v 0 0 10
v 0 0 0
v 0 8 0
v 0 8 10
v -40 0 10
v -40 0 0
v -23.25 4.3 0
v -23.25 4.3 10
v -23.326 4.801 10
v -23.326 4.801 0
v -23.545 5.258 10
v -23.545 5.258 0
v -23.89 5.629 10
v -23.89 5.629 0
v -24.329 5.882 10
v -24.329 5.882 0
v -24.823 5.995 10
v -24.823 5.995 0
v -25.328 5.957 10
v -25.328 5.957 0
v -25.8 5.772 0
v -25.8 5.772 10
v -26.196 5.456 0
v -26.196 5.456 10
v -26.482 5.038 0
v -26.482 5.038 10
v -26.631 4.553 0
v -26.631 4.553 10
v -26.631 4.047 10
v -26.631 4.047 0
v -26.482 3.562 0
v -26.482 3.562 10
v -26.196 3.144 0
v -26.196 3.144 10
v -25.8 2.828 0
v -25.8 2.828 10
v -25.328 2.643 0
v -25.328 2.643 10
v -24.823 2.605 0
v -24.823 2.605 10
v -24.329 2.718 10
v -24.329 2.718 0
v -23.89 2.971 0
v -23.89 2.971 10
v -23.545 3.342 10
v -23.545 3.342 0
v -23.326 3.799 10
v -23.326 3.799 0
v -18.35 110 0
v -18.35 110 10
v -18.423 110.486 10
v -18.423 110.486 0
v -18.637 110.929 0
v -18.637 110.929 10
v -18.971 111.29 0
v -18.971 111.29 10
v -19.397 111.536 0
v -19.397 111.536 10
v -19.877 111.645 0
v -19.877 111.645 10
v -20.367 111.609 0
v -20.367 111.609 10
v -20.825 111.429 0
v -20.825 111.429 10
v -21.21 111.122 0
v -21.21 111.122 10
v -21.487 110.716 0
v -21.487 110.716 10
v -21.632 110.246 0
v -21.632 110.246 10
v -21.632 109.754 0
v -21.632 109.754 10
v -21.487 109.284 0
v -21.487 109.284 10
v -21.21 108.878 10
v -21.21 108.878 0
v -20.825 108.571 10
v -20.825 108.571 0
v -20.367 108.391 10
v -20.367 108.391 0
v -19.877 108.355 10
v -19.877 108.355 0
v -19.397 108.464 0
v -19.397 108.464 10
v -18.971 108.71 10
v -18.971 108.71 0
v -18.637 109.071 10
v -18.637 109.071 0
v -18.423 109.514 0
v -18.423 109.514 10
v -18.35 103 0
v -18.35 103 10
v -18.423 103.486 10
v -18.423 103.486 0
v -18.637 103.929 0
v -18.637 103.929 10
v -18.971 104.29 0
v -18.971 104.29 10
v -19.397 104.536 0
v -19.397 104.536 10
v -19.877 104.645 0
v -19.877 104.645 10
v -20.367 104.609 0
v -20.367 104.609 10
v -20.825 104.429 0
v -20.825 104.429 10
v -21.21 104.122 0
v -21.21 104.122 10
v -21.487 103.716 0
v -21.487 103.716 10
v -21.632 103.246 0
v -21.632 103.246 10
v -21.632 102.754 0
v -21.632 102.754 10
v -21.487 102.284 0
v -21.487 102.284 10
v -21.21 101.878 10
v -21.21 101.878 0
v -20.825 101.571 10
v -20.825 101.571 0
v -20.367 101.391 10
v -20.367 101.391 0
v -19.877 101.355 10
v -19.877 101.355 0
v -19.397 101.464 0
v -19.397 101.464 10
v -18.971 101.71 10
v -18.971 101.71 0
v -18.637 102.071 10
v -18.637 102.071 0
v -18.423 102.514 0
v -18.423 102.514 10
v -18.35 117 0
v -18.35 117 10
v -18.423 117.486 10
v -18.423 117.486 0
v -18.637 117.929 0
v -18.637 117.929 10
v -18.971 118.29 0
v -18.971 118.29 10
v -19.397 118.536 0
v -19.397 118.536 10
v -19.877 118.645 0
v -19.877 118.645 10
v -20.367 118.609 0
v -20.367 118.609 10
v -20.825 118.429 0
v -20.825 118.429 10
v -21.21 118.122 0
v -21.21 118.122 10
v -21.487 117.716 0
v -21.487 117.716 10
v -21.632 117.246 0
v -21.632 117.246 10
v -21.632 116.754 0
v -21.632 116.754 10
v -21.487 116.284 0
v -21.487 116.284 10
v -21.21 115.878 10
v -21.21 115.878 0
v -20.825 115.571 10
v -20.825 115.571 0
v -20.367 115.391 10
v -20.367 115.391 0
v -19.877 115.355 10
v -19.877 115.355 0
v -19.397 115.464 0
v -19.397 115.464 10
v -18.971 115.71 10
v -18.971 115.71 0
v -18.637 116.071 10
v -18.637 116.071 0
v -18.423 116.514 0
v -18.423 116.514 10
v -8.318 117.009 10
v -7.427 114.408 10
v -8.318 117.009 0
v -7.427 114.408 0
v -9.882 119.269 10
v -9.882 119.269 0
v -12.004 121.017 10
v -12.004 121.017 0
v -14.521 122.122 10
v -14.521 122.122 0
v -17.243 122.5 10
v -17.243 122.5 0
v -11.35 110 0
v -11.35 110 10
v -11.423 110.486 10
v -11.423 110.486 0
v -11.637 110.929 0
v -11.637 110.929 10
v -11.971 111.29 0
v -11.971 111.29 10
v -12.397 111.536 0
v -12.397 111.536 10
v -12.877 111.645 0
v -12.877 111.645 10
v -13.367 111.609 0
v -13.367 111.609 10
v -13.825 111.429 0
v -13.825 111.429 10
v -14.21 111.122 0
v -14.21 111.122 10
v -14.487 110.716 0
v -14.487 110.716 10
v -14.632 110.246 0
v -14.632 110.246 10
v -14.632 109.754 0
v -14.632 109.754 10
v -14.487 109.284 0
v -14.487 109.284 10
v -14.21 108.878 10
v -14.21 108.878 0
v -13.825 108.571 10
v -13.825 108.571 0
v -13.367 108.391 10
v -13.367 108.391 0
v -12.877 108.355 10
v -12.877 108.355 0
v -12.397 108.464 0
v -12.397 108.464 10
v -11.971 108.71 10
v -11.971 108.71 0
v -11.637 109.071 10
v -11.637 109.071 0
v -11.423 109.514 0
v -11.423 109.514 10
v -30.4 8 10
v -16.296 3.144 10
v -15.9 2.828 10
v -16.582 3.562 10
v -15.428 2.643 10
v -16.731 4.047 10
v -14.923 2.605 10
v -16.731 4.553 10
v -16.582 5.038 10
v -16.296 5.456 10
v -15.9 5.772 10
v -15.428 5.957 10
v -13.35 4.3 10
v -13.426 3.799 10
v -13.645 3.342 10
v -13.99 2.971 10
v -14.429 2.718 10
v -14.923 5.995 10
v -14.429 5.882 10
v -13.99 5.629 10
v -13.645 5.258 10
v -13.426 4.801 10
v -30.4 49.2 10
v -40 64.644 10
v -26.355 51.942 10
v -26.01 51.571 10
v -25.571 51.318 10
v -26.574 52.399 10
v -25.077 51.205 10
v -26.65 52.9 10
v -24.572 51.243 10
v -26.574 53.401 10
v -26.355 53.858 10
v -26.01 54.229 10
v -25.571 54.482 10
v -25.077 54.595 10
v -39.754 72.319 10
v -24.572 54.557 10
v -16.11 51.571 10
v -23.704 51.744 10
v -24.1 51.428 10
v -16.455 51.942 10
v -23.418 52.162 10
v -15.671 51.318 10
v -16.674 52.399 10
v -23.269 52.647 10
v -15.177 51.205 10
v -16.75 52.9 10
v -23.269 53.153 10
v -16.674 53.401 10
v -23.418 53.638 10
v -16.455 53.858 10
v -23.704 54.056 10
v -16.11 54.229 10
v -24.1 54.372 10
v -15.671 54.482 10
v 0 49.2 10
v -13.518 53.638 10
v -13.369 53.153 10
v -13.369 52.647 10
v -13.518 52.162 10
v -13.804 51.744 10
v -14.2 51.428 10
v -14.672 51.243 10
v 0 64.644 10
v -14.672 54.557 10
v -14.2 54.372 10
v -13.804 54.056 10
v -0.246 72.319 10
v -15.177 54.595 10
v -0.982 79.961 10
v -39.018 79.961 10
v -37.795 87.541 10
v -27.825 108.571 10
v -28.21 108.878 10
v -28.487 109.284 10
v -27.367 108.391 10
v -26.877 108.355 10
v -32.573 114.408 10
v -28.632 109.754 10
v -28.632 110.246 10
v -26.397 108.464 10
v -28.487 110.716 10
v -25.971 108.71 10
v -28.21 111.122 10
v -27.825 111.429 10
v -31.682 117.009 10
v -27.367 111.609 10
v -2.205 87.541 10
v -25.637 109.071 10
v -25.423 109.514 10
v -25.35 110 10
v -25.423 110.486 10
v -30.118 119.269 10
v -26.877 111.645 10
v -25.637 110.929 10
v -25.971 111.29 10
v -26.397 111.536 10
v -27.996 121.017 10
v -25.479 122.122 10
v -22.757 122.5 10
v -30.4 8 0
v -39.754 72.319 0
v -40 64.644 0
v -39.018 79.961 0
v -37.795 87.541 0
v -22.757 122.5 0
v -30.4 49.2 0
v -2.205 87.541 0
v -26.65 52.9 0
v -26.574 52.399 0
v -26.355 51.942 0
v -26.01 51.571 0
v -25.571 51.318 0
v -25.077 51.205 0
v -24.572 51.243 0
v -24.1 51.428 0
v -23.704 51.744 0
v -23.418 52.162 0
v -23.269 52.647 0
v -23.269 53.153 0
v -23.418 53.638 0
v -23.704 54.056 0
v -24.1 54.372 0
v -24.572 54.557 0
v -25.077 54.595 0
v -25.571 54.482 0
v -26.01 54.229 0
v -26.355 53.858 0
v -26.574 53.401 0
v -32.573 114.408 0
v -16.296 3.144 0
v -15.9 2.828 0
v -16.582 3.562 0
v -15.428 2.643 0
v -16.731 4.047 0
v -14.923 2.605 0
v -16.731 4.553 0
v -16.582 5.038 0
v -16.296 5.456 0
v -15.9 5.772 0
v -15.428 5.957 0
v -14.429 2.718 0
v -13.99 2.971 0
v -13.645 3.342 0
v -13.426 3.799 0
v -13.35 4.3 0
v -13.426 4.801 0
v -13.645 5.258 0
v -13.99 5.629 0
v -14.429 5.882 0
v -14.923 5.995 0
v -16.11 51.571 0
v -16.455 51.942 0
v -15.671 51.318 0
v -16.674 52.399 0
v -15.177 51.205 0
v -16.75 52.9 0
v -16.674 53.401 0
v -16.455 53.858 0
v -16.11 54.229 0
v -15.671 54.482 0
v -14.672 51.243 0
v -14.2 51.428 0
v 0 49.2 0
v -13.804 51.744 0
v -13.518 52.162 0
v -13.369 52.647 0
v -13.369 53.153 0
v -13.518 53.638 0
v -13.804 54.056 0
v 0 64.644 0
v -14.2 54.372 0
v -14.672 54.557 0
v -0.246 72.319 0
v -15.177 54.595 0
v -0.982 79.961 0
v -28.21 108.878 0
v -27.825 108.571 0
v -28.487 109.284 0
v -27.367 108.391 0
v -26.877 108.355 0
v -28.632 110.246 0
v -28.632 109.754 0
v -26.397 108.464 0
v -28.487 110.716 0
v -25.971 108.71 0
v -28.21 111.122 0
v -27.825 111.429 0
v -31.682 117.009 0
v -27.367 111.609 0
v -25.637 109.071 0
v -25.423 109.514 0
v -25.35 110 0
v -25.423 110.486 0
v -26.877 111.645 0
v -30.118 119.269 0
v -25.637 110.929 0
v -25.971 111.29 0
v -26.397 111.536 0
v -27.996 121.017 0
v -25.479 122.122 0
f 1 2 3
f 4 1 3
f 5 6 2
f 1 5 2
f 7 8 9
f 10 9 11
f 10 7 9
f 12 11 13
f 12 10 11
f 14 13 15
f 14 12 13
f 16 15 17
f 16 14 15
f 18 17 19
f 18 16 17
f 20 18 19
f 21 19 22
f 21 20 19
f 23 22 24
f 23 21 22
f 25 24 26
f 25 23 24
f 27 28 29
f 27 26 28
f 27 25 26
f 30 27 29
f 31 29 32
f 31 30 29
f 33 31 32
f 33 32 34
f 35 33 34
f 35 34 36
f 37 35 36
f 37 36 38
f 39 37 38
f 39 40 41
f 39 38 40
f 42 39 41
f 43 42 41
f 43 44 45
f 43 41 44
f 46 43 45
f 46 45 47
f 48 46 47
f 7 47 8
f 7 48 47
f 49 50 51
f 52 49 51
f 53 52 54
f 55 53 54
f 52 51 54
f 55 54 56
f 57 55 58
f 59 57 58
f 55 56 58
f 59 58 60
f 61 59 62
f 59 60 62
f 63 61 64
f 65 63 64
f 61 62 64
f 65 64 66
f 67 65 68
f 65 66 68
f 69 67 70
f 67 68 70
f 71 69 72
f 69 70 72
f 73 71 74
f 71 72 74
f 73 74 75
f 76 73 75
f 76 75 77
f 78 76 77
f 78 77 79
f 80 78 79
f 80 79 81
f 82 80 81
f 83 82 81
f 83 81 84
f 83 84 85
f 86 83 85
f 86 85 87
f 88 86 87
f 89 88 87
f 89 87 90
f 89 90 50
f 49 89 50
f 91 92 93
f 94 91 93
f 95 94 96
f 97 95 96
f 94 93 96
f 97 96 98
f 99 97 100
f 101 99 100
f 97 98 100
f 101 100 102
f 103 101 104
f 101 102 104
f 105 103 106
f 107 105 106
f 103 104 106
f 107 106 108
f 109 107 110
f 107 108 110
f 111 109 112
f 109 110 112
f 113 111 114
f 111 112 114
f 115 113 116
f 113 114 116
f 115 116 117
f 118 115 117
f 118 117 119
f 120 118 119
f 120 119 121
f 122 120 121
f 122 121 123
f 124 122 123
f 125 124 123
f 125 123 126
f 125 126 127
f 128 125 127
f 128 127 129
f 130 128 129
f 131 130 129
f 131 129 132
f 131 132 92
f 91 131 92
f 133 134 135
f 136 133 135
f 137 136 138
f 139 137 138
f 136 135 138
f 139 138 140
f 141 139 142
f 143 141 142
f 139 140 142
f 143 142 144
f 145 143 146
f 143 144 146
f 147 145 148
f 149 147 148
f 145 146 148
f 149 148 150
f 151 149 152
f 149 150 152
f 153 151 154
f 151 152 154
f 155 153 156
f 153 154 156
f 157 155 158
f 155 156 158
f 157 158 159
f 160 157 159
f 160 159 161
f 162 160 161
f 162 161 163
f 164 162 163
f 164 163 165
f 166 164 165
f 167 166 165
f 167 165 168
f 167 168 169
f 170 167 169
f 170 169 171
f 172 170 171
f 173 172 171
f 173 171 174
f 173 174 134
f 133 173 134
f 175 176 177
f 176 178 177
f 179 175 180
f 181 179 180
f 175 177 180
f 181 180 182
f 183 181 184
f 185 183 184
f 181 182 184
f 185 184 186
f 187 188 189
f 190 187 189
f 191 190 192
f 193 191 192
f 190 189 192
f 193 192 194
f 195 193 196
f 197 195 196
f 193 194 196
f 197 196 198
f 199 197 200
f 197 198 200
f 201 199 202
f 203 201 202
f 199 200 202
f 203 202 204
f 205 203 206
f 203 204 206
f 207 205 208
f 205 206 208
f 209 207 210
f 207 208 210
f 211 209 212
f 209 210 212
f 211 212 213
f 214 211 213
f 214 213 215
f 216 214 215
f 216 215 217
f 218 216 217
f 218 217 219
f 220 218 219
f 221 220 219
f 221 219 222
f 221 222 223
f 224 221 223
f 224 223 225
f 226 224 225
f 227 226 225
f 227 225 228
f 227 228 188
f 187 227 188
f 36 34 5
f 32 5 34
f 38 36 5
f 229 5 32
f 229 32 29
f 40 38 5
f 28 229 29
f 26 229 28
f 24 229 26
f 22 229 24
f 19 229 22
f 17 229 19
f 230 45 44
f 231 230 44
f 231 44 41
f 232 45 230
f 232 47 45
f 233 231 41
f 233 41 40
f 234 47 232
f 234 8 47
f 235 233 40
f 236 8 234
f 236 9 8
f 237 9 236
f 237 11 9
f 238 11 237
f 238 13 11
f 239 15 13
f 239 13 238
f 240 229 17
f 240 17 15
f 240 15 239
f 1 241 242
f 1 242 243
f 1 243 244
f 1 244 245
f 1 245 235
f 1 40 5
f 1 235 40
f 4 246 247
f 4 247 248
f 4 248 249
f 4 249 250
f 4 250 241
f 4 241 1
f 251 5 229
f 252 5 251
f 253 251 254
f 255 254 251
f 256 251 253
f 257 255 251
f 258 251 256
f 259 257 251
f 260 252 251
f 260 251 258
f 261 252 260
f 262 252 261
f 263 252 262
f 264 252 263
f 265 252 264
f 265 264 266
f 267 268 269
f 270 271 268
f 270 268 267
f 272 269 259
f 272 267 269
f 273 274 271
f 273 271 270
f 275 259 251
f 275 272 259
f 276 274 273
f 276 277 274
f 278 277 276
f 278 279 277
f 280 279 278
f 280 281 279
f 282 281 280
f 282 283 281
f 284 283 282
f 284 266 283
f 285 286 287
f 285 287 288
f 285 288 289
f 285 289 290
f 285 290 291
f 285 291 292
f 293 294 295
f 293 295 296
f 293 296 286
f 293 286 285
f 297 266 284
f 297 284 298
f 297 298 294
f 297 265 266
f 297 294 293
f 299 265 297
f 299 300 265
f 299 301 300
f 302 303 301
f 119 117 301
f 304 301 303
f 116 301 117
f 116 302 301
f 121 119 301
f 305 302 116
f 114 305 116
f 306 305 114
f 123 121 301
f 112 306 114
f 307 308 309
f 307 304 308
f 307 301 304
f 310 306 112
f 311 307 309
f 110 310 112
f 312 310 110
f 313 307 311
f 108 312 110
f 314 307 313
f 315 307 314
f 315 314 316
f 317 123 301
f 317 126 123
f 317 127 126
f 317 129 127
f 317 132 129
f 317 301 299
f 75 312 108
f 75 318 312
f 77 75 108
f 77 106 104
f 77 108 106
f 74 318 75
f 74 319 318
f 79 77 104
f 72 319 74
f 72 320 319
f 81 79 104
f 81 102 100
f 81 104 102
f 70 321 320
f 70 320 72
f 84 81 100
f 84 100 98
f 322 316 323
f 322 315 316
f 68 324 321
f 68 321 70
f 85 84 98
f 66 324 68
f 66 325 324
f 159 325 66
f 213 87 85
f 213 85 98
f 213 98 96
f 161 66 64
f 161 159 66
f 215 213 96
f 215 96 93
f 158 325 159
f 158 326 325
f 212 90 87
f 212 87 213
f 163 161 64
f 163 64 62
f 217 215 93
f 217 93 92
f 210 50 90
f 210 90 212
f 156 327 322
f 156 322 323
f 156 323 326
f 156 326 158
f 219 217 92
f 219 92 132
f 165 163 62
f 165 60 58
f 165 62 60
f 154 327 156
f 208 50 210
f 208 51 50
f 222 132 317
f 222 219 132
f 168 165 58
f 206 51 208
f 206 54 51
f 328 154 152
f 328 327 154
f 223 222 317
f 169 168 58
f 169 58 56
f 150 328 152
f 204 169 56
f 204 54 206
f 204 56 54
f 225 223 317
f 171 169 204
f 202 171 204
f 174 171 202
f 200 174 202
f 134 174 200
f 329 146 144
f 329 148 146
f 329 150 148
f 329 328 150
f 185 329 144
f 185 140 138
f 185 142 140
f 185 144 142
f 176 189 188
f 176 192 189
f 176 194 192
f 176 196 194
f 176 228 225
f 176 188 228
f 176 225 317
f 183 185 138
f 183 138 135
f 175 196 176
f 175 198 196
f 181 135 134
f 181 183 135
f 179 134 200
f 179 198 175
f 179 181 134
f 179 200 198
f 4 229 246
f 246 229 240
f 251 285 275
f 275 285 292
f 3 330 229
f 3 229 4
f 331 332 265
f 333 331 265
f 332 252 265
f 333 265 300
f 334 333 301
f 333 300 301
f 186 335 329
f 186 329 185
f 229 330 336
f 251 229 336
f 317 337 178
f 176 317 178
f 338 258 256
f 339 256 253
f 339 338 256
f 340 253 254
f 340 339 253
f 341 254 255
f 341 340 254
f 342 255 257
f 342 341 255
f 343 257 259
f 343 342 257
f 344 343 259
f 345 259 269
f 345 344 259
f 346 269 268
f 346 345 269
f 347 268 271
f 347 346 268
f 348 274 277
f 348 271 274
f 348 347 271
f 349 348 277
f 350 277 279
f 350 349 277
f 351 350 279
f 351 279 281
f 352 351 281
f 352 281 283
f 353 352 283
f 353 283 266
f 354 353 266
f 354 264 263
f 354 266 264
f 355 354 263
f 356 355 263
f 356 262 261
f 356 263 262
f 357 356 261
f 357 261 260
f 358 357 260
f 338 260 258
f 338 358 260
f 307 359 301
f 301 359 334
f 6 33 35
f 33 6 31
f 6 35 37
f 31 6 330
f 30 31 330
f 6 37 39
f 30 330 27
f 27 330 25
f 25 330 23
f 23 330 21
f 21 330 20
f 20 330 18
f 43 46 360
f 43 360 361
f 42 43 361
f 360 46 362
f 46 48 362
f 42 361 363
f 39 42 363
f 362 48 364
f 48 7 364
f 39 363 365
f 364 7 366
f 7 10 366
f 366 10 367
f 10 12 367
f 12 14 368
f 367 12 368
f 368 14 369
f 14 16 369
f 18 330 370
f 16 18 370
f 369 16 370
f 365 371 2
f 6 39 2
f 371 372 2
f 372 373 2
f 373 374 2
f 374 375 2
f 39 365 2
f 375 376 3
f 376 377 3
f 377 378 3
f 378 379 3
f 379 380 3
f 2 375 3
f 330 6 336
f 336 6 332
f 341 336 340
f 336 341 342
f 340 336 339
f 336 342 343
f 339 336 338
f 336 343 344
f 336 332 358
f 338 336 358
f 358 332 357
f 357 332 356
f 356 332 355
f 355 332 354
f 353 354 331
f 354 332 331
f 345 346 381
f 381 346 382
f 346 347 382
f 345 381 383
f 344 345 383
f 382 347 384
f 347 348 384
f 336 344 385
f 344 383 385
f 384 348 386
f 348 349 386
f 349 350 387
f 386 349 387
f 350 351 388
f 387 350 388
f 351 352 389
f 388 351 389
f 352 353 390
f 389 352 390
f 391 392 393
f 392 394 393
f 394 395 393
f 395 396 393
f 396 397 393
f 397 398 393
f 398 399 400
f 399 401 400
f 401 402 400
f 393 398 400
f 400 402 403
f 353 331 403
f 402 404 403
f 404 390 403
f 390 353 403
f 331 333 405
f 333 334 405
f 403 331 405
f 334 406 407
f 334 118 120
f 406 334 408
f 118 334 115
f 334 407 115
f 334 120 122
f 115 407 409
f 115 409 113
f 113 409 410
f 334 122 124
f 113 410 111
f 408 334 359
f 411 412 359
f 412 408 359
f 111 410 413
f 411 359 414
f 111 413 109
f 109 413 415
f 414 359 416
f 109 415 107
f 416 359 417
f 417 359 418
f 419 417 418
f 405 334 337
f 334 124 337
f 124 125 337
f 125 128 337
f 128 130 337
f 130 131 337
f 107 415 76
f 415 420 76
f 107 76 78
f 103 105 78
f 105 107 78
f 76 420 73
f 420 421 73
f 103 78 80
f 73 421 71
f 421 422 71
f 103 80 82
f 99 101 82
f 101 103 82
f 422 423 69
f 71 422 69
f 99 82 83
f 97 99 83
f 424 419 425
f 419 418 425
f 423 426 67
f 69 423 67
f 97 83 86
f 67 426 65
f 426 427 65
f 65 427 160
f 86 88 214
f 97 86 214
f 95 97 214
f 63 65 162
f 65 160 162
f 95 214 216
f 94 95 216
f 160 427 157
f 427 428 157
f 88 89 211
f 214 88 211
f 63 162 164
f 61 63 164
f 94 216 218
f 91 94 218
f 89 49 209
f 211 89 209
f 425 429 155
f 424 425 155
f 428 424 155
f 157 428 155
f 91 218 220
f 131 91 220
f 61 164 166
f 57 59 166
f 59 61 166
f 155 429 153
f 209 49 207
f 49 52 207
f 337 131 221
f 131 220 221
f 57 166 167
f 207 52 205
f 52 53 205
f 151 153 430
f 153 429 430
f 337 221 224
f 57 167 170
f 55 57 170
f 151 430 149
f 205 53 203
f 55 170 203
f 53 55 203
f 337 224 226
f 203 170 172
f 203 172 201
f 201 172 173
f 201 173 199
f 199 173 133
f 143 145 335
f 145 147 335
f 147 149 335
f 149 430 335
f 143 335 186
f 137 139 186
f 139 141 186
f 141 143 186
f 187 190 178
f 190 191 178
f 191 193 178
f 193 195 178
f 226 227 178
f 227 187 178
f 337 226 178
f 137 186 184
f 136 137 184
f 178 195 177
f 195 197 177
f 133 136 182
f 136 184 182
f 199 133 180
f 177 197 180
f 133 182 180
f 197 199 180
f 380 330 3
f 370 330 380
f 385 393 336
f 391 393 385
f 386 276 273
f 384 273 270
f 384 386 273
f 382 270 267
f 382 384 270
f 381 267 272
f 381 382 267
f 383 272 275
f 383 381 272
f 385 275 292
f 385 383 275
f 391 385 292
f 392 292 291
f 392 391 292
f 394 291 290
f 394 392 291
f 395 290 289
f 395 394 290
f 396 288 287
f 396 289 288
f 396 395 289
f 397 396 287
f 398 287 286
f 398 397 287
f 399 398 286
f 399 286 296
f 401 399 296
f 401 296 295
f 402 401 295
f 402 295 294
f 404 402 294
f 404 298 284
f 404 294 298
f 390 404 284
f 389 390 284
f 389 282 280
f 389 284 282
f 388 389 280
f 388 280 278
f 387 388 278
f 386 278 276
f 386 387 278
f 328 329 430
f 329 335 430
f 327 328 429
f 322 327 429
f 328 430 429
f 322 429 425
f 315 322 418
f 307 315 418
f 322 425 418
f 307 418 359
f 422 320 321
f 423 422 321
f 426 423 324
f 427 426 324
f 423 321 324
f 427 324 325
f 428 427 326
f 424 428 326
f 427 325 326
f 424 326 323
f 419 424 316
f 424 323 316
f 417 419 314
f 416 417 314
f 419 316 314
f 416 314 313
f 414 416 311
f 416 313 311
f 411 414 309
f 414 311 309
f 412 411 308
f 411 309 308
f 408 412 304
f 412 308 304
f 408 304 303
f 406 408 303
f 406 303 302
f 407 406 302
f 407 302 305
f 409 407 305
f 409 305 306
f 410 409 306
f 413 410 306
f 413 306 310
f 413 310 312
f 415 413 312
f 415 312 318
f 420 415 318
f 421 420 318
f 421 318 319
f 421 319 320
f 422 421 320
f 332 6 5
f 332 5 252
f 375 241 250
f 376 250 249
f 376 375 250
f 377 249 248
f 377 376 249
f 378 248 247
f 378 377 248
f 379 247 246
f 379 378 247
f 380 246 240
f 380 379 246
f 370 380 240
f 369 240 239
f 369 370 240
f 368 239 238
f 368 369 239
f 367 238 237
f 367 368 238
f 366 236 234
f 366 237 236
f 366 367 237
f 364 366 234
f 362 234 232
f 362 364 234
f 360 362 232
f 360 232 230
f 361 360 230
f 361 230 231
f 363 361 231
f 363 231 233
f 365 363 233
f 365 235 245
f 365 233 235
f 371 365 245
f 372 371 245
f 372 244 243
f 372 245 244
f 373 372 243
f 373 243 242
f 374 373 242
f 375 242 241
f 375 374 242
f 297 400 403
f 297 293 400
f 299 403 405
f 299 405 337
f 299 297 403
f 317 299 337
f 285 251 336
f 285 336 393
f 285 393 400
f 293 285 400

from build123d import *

# Parameters (mm, degrees)
SKETCH2_W           = 40
SKETCH2_H           = 122.5
BOSS_EXTRUDE1_DEPTH = 10
SKETCH3_R           = 1.7
SKETCH3_W           = 20.8
SKETCH3_H           = 41.2
CUT_EXTRUDE3_DEPTH  = 130.252659547
SKETCH4_R           = 1.65
CUT_EXTRUDE4_DEPTH  = 130.252659547
SKETCH5_W           = 30.4
SKETCH5_H           = 41.2
SKETCH5_W_2         = 9
SKETCH5_H_2         = 52.5
CUT_EXTRUDE5_DEPTH  = 130.252659547
DRAFT11_DEPTH       = 10
FILLET4_R           = 120
FILLET5_R           = 10


# Read off the part's stored shape, not the designer's step: Draft11
with BuildPart() as part:
    # Sketch2 → Boss-Extrude1 (new body)
    with BuildSketch(Plane.XY):
        with Locations((-20, 61.25)):
            Rectangle(SKETCH2_W, SKETCH2_H)
    extrude(amount=BOSS_EXTRUDE1_DEPTH)

    # Sketch3 → Cut-Extrude3 (cut, through all)
    with BuildSketch(Plane.XY):
        with Locations((-24.95, 4.3)):
            Circle(SKETCH3_R)
        with Locations((-15.05, 4.3)):
            Circle(SKETCH3_R)
        with Locations(Location((-15.05, 52.9, 0), (0, 0, 180))):
            Circle(SKETCH3_R)
        with Locations(Location((-24.95, 52.9, 0), (0, 0, 180))):
            Circle(SKETCH3_R)
        with Locations((-20, 28.6)):
            Rectangle(SKETCH3_W, SKETCH3_H)
    extrude(amount=CUT_EXTRUDE3_DEPTH, mode=Mode.SUBTRACT)

    # Sketch4 → Cut-Extrude4 (cut, through all)
    with BuildSketch(Plane.XY.offset(10)):
        with Locations((-20, 110)):
            Circle(SKETCH4_R)
        with Locations((-27, 110)):
            Circle(SKETCH4_R)
        with Locations((-20, 117)):
            Circle(SKETCH4_R)
        with Locations((-13, 110)):
            Circle(SKETCH4_R)
        with Locations((-20, 103)):
            Circle(SKETCH4_R)
    extrude(amount=-CUT_EXTRUDE4_DEPTH, mode=Mode.SUBTRACT)

    # Sketch5 → Cut-Extrude5 (cut, through all)
    with BuildSketch(Plane.XY.offset(10)):
        with Locations((-15.2, 28.6)):
            Rectangle(SKETCH5_W, SKETCH5_H)
        with Locations((-35.5, 96.25)):
            Rectangle(SKETCH5_W_2, SKETCH5_H_2)
        with Locations((-4.5, 96.25)):
            Rectangle(SKETCH5_W_2, SKETCH5_H_2)
    extrude(amount=-CUT_EXTRUDE5_DEPTH, mode=Mode.SUBTRACT)

    # Draft11 outline → Draft11 (add)
    with BuildSketch(Plane.XY):
        Polygon((0, 70), (0, 76.199013856), (-9, 122.5), (-9, 70), align=None)
        Polygon((-31, 70), (-31, 122.5), (-40, 76.199013856), (-40, 70), align=None)
    extrude(amount=DRAFT11_DEPTH)

    # Fillet4
    fillet4_edges = [part.edges().sort_by_distance(p)[0] for p in [
        (0, 76.199013856, 5),
        (-40, 76.199013856, 5),
    ]]
    fillet(fillet4_edges, radius=FILLET4_R)

    # Fillet5
    fillet5_edges = [part.edges().sort_by_distance(p)[0] for p in [
        (-9, 122.5, 5),
        (-31, 122.5, 5),
    ]]
    fillet(fillet5_edges, radius=FILLET5_R)


solid = part.part
